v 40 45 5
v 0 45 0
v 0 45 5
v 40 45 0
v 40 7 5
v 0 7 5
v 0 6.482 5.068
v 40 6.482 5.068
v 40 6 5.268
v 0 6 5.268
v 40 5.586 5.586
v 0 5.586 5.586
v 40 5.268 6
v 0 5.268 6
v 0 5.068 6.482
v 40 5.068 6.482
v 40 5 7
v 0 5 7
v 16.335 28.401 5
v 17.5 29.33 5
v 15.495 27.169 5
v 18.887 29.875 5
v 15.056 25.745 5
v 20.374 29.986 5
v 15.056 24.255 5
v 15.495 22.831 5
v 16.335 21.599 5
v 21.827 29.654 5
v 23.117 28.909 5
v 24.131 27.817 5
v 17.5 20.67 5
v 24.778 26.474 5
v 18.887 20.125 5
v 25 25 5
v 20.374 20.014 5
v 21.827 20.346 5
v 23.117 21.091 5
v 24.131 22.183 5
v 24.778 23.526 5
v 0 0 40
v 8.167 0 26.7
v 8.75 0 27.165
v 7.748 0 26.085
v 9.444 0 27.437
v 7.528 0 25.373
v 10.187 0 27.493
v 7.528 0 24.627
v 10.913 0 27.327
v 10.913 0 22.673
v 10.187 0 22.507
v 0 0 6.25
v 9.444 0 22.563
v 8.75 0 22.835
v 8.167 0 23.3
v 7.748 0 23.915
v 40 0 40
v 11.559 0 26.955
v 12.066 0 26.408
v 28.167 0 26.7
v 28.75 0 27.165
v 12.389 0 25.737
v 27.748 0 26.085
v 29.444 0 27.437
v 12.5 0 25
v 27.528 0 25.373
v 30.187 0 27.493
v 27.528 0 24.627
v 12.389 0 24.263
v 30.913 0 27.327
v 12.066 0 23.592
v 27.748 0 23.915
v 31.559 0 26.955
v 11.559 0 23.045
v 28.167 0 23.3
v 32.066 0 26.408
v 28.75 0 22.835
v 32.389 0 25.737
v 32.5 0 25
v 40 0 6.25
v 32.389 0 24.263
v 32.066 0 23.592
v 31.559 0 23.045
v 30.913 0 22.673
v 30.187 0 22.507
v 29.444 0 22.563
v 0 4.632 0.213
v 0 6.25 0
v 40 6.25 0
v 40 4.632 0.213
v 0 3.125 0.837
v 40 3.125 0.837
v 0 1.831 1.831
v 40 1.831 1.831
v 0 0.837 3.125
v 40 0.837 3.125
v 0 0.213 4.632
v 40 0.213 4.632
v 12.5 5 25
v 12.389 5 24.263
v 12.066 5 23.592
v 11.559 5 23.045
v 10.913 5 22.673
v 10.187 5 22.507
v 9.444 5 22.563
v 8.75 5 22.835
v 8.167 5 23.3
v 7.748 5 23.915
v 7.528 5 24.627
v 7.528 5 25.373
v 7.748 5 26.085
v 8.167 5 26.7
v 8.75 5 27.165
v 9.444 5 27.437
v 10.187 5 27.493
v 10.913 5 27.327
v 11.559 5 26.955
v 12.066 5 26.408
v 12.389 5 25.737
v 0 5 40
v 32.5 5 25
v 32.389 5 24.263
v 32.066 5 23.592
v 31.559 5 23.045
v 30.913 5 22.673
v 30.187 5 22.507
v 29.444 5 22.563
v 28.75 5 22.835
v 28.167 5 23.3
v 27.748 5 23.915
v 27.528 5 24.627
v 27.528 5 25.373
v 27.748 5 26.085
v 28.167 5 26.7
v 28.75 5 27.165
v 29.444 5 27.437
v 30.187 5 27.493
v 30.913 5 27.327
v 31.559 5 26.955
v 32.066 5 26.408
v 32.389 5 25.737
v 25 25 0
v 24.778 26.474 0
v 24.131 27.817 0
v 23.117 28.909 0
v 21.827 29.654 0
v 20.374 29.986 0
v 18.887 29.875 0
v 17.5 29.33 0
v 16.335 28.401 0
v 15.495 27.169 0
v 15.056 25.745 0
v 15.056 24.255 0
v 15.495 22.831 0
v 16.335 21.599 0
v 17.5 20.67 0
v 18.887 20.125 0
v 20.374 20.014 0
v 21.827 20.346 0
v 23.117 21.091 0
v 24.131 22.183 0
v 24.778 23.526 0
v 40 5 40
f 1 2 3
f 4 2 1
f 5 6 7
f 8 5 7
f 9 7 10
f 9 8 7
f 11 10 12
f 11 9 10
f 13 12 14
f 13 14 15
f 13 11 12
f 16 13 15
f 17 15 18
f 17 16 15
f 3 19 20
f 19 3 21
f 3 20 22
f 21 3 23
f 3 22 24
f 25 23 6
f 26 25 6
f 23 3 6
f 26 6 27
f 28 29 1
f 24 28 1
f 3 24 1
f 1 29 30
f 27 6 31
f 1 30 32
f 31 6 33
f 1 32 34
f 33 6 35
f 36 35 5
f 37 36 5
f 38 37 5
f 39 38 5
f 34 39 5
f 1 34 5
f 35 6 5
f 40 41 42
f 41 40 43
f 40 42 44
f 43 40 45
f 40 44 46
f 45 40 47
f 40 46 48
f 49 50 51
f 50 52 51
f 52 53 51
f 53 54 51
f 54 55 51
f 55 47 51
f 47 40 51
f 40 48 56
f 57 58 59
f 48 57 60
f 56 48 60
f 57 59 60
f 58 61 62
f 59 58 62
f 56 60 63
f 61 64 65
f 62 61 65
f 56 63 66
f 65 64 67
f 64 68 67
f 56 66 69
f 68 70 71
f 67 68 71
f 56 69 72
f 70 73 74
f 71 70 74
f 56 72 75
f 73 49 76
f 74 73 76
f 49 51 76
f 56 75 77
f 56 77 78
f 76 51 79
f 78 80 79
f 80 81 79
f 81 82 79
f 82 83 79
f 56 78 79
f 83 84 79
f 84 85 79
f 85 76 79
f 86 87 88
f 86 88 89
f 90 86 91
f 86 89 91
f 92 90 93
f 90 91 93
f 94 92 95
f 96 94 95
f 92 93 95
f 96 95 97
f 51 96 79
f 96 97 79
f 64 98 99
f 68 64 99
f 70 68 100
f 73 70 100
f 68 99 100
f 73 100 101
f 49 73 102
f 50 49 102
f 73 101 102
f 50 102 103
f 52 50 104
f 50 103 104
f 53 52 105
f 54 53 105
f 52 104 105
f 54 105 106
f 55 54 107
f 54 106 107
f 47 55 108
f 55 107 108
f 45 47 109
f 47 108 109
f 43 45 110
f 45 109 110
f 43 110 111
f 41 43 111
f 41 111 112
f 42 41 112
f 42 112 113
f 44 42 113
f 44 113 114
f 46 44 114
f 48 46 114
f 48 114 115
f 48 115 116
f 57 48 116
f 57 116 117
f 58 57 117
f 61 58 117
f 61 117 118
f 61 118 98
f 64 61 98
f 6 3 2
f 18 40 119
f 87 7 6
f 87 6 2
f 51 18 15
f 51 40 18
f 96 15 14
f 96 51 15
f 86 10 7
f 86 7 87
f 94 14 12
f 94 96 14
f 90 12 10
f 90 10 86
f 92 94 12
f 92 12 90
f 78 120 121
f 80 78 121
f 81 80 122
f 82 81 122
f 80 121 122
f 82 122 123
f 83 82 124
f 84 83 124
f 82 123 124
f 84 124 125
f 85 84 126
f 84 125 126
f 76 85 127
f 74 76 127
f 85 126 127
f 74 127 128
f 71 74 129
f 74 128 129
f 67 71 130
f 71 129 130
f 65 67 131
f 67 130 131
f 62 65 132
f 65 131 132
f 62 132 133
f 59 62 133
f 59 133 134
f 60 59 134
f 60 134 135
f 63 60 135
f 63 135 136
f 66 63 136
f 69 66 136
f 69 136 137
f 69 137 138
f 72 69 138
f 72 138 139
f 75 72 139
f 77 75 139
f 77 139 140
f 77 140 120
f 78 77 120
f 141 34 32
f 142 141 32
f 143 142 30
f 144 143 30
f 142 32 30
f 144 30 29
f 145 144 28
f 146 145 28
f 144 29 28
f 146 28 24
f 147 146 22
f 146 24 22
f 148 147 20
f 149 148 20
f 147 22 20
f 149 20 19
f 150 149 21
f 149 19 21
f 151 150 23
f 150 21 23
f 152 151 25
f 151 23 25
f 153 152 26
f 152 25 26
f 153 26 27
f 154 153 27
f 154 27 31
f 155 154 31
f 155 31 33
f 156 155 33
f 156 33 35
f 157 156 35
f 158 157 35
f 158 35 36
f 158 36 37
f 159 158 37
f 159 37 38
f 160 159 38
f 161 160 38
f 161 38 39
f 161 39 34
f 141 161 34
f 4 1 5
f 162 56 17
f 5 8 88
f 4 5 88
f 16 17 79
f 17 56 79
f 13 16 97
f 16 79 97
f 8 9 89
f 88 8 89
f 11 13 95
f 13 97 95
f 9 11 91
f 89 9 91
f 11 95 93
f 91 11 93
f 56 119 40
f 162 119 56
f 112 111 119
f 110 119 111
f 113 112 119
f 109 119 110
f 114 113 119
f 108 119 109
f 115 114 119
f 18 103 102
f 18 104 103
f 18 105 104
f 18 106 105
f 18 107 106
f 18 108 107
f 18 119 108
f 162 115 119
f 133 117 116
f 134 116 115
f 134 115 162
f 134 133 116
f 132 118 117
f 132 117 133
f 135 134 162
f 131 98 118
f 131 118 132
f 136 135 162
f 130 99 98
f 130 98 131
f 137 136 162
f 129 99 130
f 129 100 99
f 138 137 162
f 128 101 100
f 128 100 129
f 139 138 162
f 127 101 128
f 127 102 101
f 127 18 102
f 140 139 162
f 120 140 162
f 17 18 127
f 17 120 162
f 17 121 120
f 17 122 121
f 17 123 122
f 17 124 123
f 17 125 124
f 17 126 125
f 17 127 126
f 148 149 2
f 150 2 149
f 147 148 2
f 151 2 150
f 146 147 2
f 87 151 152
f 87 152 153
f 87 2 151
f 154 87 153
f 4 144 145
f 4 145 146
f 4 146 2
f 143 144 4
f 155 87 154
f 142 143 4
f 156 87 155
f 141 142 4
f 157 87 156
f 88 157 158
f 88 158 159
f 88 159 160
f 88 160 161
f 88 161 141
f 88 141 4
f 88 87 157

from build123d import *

# Parameters (mm, degrees)
SKETCH2_W           = 40
SKETCH2_H           = 5
BOSS_EXTRUDE1_DEPTH = 40
SKETCH3_W           = 40
SKETCH3_H           = 5
BOSS_EXTRUDE2_DEPTH = 40
SKETCH4_R           = 2.5
CUT_EXTRUDE1_DEPTH  = 10
SKETCH5_R           = 5
CUT_EXTRUDE2_DEPTH  = 10
FILLET1_R           = 6.25
FILLET2_R           = 2


with BuildPart() as part:
    # Sketch2 → Boss-Extrude1 (new body)
    with BuildSketch(Plane.XY):
        with Locations((20, 2.5)):
            Rectangle(SKETCH2_W, SKETCH2_H)
    extrude(amount=BOSS_EXTRUDE1_DEPTH)

    # Sketch3 → Boss-Extrude2 (add)
    with BuildSketch(Plane(origin=(0, 5, 0), x_dir=(1, 0, 0), z_dir=(0, 1, 0))):
        with Locations((20, -2.5)):
            Rectangle(SKETCH3_W, SKETCH3_H)
    extrude(amount=BOSS_EXTRUDE2_DEPTH)

    # Sketch4 → Cut-Extrude1 (cut)
    with BuildSketch(Plane(origin=(0, 5, 0), x_dir=(1, 0, 0), z_dir=(0, 1, 0))):
        with Locations((10, -25)):
            Circle(SKETCH4_R)
        with Locations((30, -25)):
            Circle(SKETCH4_R)
    extrude(amount=-CUT_EXTRUDE1_DEPTH, mode=Mode.SUBTRACT)

    # Sketch5 → Cut-Extrude2 (cut)
    with BuildSketch(Plane.XY.offset(5)):
        with Locations((20, 25)):
            Circle(SKETCH5_R)
    extrude(amount=-CUT_EXTRUDE2_DEPTH, mode=Mode.SUBTRACT)

    # Fillet1
    fillet1_edges = [part.edges().sort_by_distance(p)[0] for p in [
        (20, 0, 0),
    ]]
    fillet(fillet1_edges, radius=FILLET1_R)

    # Fillet2
    fillet2_edges = [part.edges().sort_by_distance(p)[0] for p in [
        (20, 5, 5),
    ]]
    fillet(fillet2_edges, radius=FILLET2_R)


solid = part.part
